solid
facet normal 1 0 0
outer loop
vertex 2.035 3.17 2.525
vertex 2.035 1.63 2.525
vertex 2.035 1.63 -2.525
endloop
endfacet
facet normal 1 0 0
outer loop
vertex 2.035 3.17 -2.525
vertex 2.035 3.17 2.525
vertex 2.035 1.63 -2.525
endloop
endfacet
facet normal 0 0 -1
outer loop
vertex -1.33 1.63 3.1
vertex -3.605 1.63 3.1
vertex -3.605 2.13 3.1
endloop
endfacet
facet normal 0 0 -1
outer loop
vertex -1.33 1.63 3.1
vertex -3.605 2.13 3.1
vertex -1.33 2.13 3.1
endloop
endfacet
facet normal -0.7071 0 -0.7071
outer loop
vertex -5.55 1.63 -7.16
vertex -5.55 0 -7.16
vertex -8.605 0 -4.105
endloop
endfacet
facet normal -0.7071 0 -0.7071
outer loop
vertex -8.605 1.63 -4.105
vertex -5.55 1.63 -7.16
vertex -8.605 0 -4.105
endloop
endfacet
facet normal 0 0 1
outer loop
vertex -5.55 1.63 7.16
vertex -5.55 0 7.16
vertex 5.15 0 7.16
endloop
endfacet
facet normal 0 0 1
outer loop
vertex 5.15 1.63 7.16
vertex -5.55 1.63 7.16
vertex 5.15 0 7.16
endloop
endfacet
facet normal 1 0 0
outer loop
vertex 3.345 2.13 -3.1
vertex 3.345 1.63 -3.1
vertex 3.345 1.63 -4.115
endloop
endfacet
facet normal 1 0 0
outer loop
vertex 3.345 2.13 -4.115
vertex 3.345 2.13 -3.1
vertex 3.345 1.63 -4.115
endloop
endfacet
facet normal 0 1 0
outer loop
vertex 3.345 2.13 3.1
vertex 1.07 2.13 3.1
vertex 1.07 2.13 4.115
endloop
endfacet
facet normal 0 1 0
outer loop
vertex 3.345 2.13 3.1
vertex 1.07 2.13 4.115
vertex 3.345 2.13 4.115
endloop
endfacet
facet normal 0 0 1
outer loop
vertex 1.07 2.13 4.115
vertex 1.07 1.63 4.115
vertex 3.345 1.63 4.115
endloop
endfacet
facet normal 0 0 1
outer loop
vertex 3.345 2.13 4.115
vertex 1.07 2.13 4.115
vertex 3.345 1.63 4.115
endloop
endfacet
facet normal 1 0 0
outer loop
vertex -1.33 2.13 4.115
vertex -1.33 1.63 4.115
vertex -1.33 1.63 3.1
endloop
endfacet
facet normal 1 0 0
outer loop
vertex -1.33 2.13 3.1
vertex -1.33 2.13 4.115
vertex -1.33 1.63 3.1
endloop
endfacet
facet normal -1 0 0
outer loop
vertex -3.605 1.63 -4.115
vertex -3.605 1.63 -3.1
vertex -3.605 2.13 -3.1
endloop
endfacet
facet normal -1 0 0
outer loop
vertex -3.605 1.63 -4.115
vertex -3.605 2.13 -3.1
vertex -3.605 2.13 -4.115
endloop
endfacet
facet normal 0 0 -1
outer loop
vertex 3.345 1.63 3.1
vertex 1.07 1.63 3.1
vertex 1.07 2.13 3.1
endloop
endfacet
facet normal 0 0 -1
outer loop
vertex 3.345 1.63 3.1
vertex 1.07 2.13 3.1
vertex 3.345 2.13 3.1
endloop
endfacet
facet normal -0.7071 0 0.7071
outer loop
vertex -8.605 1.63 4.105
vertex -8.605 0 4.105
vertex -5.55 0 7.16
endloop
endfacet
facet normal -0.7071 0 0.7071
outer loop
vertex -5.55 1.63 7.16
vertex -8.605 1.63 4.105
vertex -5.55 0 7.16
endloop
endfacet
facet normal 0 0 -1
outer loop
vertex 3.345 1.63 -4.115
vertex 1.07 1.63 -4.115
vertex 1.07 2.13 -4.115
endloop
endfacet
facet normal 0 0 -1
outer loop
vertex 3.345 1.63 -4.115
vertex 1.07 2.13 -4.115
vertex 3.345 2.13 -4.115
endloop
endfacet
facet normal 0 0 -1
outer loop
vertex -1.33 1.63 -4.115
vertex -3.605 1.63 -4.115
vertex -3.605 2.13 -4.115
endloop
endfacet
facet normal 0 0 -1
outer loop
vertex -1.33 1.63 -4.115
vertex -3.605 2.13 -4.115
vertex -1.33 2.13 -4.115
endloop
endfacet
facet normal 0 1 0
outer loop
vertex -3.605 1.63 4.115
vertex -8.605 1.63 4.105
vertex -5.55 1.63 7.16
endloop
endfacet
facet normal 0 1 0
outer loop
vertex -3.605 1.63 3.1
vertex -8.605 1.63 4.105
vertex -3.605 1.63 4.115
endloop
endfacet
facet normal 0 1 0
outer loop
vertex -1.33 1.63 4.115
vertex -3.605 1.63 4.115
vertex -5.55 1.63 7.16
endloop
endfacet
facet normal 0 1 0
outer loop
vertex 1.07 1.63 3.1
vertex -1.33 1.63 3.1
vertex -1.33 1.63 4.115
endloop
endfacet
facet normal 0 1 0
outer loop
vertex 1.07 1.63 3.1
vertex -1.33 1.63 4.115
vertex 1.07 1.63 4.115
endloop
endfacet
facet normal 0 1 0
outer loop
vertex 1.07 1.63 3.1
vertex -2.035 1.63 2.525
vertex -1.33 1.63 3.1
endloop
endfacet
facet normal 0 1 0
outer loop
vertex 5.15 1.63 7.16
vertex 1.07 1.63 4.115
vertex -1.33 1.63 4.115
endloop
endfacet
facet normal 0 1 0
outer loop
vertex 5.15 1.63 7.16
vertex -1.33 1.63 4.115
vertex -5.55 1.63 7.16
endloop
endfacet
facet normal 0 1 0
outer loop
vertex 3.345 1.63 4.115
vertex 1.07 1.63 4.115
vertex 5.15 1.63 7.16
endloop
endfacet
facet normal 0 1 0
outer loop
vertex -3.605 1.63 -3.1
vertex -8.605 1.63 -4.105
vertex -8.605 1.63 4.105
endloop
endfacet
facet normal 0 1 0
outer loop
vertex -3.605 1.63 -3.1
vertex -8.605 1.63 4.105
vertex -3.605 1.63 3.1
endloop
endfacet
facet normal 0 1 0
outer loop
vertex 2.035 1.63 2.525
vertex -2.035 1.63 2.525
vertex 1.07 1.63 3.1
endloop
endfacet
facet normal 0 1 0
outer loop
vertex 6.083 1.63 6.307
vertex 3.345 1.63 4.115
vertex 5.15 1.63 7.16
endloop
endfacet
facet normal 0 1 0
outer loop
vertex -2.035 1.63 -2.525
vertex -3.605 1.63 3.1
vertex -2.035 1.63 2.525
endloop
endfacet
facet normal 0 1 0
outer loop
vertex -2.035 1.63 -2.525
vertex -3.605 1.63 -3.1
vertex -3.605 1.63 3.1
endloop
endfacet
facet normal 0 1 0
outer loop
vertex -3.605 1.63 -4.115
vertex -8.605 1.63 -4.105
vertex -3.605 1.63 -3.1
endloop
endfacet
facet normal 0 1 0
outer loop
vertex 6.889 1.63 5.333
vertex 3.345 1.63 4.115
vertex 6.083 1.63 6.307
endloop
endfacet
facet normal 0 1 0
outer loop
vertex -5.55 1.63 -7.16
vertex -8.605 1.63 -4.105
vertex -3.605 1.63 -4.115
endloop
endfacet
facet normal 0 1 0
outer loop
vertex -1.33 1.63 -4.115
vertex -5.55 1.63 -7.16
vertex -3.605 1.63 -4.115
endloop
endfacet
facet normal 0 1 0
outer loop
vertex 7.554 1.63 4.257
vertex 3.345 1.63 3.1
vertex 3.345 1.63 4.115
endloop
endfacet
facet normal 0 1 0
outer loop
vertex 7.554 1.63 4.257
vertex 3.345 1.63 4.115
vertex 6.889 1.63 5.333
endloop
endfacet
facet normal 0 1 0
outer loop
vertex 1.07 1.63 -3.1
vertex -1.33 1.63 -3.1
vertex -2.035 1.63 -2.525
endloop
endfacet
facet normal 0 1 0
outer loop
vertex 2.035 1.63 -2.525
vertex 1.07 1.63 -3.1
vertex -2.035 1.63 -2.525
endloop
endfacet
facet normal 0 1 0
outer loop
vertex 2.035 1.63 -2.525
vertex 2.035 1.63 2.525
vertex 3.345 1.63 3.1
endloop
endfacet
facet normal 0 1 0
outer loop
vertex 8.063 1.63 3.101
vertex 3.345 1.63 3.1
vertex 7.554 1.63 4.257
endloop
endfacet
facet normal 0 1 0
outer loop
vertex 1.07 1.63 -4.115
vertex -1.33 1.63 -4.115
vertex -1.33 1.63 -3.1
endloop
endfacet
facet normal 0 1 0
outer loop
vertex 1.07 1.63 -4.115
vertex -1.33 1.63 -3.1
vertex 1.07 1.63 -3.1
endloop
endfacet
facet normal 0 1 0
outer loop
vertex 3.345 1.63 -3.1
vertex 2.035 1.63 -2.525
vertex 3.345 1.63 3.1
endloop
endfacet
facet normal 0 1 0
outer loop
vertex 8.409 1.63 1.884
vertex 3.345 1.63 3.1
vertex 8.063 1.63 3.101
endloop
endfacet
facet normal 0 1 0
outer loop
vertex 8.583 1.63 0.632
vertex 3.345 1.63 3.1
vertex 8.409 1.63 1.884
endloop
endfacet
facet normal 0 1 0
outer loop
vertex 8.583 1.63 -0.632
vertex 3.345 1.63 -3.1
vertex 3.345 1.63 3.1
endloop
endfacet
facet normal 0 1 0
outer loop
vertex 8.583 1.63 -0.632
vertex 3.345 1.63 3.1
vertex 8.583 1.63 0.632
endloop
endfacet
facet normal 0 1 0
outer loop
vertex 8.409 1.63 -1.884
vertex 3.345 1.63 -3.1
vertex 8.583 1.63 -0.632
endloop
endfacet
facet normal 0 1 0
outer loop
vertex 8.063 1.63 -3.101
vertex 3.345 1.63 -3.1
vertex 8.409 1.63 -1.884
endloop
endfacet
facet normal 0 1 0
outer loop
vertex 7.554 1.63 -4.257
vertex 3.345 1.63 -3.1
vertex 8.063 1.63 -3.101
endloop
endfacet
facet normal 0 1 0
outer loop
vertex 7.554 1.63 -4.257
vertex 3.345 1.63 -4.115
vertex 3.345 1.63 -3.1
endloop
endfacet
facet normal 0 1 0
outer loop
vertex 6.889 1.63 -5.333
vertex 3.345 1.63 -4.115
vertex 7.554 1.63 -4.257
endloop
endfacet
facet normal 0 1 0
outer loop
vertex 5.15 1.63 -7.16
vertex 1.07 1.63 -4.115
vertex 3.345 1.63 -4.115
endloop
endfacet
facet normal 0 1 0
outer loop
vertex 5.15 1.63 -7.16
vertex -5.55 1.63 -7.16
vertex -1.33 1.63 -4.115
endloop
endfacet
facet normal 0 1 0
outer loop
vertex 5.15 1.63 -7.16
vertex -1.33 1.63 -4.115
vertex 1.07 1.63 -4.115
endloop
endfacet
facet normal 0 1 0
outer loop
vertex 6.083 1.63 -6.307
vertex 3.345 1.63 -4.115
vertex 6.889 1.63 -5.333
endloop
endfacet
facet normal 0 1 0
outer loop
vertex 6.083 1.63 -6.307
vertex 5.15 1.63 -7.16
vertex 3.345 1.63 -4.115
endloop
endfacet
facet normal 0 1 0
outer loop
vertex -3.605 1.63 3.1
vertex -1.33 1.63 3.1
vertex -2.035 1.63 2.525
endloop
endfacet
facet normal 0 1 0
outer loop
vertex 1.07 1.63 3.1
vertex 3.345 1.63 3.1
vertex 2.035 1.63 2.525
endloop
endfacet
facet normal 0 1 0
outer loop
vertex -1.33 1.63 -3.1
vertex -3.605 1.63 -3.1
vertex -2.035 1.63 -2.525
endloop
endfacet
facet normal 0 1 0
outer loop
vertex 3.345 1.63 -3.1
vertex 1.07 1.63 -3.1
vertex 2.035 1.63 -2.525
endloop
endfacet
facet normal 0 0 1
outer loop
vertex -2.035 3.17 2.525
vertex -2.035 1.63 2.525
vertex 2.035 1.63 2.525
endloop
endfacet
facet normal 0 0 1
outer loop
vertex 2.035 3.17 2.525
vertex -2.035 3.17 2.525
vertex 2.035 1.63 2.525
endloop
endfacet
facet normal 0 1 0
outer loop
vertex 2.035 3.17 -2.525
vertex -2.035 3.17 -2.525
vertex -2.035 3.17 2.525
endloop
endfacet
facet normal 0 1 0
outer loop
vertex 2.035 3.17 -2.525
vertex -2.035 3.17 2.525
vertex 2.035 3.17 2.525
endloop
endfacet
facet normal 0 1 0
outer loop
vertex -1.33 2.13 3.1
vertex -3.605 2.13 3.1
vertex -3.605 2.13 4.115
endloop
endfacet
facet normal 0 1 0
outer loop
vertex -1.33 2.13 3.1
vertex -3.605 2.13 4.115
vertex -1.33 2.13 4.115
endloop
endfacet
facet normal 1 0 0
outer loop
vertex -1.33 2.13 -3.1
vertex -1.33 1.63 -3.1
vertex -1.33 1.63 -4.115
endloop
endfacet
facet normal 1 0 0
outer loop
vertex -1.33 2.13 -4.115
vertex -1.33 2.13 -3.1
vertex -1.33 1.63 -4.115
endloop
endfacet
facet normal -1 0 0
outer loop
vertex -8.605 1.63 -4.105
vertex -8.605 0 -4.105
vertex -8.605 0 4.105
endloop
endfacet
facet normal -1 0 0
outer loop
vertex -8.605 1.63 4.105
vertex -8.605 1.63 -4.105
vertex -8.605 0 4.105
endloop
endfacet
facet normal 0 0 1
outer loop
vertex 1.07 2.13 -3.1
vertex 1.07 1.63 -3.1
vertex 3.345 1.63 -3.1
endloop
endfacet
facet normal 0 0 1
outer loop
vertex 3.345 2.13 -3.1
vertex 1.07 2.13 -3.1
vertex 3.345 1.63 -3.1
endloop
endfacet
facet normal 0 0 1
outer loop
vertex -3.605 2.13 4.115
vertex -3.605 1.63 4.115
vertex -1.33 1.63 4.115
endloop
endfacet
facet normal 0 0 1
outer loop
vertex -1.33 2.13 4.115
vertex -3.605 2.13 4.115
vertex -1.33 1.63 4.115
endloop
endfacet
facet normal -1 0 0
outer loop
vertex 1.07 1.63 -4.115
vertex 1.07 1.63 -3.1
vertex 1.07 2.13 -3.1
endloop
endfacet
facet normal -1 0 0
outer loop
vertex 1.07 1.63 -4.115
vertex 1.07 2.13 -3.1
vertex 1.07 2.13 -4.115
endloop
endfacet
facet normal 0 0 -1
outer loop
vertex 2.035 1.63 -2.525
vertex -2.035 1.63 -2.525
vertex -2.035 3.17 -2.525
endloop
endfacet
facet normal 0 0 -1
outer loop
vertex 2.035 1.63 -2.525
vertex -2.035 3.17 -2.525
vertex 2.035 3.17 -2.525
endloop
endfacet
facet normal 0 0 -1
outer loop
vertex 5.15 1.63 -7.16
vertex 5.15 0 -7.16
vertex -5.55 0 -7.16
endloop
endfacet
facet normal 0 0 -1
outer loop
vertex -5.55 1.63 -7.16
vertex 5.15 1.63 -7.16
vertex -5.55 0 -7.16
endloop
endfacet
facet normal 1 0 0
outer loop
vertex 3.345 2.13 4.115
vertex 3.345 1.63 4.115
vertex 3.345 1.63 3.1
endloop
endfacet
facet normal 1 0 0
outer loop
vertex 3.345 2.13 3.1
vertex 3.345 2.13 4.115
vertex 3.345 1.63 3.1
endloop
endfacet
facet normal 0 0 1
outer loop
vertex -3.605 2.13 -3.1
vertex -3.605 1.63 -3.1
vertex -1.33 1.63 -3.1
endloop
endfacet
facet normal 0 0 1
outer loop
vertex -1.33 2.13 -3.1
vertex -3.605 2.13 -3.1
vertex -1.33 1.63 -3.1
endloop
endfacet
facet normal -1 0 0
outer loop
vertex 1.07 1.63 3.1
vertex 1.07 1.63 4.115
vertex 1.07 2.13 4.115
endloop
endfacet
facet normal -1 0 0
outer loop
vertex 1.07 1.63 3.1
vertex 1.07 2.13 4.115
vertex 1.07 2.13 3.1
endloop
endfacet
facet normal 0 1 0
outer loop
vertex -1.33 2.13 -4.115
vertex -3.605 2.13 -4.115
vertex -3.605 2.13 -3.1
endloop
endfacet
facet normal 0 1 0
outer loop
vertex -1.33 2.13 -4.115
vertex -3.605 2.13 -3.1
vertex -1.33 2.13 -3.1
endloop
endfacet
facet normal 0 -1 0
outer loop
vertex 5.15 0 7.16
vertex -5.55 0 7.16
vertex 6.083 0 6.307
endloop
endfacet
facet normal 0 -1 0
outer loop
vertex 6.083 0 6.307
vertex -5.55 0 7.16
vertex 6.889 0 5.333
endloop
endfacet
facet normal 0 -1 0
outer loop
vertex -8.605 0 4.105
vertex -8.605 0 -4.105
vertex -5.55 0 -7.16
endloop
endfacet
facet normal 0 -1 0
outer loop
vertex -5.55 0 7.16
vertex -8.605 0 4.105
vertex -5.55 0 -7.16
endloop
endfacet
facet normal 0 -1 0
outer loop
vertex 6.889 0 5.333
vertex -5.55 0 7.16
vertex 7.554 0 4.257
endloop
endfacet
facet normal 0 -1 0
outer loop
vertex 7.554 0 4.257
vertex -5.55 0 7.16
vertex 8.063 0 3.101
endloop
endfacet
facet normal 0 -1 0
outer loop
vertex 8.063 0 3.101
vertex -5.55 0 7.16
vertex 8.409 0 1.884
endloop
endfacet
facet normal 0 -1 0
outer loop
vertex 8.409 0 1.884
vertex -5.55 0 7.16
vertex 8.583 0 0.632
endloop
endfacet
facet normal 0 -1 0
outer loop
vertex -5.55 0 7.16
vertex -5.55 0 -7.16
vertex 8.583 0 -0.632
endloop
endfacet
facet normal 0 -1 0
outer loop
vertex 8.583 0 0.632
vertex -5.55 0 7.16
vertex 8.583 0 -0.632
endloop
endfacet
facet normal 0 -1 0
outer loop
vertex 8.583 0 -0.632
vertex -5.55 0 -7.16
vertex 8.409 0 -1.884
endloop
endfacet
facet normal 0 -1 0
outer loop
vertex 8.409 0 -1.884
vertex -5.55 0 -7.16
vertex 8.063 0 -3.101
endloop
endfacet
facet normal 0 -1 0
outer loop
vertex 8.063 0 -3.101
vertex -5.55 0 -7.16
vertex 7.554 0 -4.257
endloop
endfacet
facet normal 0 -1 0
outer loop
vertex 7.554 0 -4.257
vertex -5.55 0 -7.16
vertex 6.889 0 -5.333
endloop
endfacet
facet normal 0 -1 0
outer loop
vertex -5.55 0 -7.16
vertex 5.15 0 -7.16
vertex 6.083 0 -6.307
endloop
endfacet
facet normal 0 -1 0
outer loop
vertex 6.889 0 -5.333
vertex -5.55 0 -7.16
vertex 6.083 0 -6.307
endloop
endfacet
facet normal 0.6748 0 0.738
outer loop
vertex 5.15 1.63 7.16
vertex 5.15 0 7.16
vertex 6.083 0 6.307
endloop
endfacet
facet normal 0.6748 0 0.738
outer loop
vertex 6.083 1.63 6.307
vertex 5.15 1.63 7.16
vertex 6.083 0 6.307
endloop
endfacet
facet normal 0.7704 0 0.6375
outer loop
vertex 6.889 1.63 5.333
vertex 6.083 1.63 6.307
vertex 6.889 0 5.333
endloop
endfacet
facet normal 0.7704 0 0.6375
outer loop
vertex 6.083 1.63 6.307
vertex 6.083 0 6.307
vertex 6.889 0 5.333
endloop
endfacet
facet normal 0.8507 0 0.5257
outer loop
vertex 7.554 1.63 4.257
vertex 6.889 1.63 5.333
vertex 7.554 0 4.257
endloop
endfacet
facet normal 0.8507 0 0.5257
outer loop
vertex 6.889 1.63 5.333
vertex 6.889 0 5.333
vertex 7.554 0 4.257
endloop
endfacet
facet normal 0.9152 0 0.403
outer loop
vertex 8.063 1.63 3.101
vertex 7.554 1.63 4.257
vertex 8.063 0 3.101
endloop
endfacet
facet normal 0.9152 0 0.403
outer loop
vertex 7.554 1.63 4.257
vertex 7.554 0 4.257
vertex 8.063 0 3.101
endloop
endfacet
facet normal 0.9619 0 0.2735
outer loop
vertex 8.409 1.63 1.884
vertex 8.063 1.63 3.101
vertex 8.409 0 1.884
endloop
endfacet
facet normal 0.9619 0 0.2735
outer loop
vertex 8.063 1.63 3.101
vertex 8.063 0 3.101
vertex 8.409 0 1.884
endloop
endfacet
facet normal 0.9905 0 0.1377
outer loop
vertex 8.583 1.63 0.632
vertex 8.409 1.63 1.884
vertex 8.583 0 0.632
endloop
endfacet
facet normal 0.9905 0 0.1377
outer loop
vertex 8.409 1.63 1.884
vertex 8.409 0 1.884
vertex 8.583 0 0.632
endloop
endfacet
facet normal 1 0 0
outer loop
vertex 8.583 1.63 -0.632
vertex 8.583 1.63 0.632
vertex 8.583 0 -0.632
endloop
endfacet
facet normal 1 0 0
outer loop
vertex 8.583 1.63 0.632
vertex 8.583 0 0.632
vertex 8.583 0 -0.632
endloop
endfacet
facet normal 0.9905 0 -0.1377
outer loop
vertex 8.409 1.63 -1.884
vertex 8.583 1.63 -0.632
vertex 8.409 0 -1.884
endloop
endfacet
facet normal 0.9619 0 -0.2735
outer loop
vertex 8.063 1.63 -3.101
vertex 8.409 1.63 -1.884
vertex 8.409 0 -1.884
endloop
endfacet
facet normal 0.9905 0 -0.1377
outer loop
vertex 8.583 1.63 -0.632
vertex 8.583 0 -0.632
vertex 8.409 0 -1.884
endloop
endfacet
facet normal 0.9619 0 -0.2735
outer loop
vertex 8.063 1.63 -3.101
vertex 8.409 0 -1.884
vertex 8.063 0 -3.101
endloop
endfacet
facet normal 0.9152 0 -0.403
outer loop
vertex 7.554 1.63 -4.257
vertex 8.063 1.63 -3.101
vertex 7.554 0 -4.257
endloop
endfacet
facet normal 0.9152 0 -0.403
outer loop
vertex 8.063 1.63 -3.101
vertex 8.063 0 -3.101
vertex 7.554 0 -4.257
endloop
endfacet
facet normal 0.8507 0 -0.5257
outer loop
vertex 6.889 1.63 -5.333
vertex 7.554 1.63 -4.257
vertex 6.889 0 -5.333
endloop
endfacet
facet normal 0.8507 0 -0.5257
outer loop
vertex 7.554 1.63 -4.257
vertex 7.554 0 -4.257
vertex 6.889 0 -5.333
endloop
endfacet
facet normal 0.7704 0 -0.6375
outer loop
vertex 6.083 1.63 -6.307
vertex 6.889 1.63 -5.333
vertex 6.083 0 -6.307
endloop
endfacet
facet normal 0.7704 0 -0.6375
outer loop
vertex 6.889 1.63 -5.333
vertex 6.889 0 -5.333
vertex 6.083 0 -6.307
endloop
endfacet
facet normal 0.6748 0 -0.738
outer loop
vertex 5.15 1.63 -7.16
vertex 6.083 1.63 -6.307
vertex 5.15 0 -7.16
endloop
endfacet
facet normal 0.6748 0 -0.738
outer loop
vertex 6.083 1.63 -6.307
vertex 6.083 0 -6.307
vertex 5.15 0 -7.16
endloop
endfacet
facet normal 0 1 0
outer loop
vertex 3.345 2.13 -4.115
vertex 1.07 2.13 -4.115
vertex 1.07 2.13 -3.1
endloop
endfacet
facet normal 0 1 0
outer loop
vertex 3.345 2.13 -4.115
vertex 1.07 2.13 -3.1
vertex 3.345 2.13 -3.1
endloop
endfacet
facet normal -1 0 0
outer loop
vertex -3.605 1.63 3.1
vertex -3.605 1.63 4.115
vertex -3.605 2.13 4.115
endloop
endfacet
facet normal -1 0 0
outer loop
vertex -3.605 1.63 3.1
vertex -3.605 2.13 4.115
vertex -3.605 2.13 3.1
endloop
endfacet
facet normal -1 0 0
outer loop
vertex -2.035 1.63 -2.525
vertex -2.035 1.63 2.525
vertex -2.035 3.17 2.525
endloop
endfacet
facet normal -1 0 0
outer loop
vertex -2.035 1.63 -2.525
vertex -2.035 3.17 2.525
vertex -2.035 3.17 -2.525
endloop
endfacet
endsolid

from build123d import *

# Parameters (mm, degrees)
BOSS_EXTRUDE1_DEPTH = 1.63
SKETCH2_W           = 4.07
SKETCH2_H           = 5.05
BOSS_EXTRUDE2_DEPTH = 1.54
SKETCH3_W           = 2.275
SKETCH3_H           = 1.015
BOSS_EXTRUDE3_DEPTH = 0.5


with BuildPart() as part:
    # Sketch1 → Boss-Extrude1 (new body)
    with BuildSketch(Plane(origin=(0, 0, 0), x_dir=(1, 0, 0), z_dir=(0, 1, 0))):
        with BuildLine():
            Line((-8.605, 4.105), (-8.605, -4.105))
            Line((-8.605, -4.105), (-5.55, -7.16))
            Line((-5.55, -7.16), (5.15, -7.16))
            ThreePointArc((5.15, -7.16), (8.605, 0), (5.15, 7.16))
            Line((5.15, 7.16), (-5.55, 7.16))
            Line((-5.55, 7.16), (-8.605, 4.105))
        make_face()
    extrude(amount=BOSS_EXTRUDE1_DEPTH)

    # Sketch2 → Boss-Extrude2 (add)
    with BuildSketch(Plane(origin=(0, 1.63, 0), x_dir=(1, 0, 0), z_dir=(0, 1, 0))):
        Rectangle(SKETCH2_W, SKETCH2_H)
    extrude(amount=BOSS_EXTRUDE2_DEPTH)

    # Sketch3 → Boss-Extrude3 (add)
    with BuildSketch(Plane(origin=(0, 1.63, 0), x_dir=(1, 0, 0), z_dir=(0, 1, 0))):
        with Locations((-2.4675, 3.6075)):
            Rectangle(SKETCH3_W, SKETCH3_H)
        with Locations((2.2075, 3.6075)):
            Rectangle(SKETCH3_W, SKETCH3_H)
        with Locations((-2.4675, -3.6075)):
            Rectangle(SKETCH3_W, SKETCH3_H)
        with Locations((2.2075, -3.6075)):
            Rectangle(SKETCH3_W, SKETCH3_H)
    extrude(amount=BOSS_EXTRUDE3_DEPTH)


solid = part.part
